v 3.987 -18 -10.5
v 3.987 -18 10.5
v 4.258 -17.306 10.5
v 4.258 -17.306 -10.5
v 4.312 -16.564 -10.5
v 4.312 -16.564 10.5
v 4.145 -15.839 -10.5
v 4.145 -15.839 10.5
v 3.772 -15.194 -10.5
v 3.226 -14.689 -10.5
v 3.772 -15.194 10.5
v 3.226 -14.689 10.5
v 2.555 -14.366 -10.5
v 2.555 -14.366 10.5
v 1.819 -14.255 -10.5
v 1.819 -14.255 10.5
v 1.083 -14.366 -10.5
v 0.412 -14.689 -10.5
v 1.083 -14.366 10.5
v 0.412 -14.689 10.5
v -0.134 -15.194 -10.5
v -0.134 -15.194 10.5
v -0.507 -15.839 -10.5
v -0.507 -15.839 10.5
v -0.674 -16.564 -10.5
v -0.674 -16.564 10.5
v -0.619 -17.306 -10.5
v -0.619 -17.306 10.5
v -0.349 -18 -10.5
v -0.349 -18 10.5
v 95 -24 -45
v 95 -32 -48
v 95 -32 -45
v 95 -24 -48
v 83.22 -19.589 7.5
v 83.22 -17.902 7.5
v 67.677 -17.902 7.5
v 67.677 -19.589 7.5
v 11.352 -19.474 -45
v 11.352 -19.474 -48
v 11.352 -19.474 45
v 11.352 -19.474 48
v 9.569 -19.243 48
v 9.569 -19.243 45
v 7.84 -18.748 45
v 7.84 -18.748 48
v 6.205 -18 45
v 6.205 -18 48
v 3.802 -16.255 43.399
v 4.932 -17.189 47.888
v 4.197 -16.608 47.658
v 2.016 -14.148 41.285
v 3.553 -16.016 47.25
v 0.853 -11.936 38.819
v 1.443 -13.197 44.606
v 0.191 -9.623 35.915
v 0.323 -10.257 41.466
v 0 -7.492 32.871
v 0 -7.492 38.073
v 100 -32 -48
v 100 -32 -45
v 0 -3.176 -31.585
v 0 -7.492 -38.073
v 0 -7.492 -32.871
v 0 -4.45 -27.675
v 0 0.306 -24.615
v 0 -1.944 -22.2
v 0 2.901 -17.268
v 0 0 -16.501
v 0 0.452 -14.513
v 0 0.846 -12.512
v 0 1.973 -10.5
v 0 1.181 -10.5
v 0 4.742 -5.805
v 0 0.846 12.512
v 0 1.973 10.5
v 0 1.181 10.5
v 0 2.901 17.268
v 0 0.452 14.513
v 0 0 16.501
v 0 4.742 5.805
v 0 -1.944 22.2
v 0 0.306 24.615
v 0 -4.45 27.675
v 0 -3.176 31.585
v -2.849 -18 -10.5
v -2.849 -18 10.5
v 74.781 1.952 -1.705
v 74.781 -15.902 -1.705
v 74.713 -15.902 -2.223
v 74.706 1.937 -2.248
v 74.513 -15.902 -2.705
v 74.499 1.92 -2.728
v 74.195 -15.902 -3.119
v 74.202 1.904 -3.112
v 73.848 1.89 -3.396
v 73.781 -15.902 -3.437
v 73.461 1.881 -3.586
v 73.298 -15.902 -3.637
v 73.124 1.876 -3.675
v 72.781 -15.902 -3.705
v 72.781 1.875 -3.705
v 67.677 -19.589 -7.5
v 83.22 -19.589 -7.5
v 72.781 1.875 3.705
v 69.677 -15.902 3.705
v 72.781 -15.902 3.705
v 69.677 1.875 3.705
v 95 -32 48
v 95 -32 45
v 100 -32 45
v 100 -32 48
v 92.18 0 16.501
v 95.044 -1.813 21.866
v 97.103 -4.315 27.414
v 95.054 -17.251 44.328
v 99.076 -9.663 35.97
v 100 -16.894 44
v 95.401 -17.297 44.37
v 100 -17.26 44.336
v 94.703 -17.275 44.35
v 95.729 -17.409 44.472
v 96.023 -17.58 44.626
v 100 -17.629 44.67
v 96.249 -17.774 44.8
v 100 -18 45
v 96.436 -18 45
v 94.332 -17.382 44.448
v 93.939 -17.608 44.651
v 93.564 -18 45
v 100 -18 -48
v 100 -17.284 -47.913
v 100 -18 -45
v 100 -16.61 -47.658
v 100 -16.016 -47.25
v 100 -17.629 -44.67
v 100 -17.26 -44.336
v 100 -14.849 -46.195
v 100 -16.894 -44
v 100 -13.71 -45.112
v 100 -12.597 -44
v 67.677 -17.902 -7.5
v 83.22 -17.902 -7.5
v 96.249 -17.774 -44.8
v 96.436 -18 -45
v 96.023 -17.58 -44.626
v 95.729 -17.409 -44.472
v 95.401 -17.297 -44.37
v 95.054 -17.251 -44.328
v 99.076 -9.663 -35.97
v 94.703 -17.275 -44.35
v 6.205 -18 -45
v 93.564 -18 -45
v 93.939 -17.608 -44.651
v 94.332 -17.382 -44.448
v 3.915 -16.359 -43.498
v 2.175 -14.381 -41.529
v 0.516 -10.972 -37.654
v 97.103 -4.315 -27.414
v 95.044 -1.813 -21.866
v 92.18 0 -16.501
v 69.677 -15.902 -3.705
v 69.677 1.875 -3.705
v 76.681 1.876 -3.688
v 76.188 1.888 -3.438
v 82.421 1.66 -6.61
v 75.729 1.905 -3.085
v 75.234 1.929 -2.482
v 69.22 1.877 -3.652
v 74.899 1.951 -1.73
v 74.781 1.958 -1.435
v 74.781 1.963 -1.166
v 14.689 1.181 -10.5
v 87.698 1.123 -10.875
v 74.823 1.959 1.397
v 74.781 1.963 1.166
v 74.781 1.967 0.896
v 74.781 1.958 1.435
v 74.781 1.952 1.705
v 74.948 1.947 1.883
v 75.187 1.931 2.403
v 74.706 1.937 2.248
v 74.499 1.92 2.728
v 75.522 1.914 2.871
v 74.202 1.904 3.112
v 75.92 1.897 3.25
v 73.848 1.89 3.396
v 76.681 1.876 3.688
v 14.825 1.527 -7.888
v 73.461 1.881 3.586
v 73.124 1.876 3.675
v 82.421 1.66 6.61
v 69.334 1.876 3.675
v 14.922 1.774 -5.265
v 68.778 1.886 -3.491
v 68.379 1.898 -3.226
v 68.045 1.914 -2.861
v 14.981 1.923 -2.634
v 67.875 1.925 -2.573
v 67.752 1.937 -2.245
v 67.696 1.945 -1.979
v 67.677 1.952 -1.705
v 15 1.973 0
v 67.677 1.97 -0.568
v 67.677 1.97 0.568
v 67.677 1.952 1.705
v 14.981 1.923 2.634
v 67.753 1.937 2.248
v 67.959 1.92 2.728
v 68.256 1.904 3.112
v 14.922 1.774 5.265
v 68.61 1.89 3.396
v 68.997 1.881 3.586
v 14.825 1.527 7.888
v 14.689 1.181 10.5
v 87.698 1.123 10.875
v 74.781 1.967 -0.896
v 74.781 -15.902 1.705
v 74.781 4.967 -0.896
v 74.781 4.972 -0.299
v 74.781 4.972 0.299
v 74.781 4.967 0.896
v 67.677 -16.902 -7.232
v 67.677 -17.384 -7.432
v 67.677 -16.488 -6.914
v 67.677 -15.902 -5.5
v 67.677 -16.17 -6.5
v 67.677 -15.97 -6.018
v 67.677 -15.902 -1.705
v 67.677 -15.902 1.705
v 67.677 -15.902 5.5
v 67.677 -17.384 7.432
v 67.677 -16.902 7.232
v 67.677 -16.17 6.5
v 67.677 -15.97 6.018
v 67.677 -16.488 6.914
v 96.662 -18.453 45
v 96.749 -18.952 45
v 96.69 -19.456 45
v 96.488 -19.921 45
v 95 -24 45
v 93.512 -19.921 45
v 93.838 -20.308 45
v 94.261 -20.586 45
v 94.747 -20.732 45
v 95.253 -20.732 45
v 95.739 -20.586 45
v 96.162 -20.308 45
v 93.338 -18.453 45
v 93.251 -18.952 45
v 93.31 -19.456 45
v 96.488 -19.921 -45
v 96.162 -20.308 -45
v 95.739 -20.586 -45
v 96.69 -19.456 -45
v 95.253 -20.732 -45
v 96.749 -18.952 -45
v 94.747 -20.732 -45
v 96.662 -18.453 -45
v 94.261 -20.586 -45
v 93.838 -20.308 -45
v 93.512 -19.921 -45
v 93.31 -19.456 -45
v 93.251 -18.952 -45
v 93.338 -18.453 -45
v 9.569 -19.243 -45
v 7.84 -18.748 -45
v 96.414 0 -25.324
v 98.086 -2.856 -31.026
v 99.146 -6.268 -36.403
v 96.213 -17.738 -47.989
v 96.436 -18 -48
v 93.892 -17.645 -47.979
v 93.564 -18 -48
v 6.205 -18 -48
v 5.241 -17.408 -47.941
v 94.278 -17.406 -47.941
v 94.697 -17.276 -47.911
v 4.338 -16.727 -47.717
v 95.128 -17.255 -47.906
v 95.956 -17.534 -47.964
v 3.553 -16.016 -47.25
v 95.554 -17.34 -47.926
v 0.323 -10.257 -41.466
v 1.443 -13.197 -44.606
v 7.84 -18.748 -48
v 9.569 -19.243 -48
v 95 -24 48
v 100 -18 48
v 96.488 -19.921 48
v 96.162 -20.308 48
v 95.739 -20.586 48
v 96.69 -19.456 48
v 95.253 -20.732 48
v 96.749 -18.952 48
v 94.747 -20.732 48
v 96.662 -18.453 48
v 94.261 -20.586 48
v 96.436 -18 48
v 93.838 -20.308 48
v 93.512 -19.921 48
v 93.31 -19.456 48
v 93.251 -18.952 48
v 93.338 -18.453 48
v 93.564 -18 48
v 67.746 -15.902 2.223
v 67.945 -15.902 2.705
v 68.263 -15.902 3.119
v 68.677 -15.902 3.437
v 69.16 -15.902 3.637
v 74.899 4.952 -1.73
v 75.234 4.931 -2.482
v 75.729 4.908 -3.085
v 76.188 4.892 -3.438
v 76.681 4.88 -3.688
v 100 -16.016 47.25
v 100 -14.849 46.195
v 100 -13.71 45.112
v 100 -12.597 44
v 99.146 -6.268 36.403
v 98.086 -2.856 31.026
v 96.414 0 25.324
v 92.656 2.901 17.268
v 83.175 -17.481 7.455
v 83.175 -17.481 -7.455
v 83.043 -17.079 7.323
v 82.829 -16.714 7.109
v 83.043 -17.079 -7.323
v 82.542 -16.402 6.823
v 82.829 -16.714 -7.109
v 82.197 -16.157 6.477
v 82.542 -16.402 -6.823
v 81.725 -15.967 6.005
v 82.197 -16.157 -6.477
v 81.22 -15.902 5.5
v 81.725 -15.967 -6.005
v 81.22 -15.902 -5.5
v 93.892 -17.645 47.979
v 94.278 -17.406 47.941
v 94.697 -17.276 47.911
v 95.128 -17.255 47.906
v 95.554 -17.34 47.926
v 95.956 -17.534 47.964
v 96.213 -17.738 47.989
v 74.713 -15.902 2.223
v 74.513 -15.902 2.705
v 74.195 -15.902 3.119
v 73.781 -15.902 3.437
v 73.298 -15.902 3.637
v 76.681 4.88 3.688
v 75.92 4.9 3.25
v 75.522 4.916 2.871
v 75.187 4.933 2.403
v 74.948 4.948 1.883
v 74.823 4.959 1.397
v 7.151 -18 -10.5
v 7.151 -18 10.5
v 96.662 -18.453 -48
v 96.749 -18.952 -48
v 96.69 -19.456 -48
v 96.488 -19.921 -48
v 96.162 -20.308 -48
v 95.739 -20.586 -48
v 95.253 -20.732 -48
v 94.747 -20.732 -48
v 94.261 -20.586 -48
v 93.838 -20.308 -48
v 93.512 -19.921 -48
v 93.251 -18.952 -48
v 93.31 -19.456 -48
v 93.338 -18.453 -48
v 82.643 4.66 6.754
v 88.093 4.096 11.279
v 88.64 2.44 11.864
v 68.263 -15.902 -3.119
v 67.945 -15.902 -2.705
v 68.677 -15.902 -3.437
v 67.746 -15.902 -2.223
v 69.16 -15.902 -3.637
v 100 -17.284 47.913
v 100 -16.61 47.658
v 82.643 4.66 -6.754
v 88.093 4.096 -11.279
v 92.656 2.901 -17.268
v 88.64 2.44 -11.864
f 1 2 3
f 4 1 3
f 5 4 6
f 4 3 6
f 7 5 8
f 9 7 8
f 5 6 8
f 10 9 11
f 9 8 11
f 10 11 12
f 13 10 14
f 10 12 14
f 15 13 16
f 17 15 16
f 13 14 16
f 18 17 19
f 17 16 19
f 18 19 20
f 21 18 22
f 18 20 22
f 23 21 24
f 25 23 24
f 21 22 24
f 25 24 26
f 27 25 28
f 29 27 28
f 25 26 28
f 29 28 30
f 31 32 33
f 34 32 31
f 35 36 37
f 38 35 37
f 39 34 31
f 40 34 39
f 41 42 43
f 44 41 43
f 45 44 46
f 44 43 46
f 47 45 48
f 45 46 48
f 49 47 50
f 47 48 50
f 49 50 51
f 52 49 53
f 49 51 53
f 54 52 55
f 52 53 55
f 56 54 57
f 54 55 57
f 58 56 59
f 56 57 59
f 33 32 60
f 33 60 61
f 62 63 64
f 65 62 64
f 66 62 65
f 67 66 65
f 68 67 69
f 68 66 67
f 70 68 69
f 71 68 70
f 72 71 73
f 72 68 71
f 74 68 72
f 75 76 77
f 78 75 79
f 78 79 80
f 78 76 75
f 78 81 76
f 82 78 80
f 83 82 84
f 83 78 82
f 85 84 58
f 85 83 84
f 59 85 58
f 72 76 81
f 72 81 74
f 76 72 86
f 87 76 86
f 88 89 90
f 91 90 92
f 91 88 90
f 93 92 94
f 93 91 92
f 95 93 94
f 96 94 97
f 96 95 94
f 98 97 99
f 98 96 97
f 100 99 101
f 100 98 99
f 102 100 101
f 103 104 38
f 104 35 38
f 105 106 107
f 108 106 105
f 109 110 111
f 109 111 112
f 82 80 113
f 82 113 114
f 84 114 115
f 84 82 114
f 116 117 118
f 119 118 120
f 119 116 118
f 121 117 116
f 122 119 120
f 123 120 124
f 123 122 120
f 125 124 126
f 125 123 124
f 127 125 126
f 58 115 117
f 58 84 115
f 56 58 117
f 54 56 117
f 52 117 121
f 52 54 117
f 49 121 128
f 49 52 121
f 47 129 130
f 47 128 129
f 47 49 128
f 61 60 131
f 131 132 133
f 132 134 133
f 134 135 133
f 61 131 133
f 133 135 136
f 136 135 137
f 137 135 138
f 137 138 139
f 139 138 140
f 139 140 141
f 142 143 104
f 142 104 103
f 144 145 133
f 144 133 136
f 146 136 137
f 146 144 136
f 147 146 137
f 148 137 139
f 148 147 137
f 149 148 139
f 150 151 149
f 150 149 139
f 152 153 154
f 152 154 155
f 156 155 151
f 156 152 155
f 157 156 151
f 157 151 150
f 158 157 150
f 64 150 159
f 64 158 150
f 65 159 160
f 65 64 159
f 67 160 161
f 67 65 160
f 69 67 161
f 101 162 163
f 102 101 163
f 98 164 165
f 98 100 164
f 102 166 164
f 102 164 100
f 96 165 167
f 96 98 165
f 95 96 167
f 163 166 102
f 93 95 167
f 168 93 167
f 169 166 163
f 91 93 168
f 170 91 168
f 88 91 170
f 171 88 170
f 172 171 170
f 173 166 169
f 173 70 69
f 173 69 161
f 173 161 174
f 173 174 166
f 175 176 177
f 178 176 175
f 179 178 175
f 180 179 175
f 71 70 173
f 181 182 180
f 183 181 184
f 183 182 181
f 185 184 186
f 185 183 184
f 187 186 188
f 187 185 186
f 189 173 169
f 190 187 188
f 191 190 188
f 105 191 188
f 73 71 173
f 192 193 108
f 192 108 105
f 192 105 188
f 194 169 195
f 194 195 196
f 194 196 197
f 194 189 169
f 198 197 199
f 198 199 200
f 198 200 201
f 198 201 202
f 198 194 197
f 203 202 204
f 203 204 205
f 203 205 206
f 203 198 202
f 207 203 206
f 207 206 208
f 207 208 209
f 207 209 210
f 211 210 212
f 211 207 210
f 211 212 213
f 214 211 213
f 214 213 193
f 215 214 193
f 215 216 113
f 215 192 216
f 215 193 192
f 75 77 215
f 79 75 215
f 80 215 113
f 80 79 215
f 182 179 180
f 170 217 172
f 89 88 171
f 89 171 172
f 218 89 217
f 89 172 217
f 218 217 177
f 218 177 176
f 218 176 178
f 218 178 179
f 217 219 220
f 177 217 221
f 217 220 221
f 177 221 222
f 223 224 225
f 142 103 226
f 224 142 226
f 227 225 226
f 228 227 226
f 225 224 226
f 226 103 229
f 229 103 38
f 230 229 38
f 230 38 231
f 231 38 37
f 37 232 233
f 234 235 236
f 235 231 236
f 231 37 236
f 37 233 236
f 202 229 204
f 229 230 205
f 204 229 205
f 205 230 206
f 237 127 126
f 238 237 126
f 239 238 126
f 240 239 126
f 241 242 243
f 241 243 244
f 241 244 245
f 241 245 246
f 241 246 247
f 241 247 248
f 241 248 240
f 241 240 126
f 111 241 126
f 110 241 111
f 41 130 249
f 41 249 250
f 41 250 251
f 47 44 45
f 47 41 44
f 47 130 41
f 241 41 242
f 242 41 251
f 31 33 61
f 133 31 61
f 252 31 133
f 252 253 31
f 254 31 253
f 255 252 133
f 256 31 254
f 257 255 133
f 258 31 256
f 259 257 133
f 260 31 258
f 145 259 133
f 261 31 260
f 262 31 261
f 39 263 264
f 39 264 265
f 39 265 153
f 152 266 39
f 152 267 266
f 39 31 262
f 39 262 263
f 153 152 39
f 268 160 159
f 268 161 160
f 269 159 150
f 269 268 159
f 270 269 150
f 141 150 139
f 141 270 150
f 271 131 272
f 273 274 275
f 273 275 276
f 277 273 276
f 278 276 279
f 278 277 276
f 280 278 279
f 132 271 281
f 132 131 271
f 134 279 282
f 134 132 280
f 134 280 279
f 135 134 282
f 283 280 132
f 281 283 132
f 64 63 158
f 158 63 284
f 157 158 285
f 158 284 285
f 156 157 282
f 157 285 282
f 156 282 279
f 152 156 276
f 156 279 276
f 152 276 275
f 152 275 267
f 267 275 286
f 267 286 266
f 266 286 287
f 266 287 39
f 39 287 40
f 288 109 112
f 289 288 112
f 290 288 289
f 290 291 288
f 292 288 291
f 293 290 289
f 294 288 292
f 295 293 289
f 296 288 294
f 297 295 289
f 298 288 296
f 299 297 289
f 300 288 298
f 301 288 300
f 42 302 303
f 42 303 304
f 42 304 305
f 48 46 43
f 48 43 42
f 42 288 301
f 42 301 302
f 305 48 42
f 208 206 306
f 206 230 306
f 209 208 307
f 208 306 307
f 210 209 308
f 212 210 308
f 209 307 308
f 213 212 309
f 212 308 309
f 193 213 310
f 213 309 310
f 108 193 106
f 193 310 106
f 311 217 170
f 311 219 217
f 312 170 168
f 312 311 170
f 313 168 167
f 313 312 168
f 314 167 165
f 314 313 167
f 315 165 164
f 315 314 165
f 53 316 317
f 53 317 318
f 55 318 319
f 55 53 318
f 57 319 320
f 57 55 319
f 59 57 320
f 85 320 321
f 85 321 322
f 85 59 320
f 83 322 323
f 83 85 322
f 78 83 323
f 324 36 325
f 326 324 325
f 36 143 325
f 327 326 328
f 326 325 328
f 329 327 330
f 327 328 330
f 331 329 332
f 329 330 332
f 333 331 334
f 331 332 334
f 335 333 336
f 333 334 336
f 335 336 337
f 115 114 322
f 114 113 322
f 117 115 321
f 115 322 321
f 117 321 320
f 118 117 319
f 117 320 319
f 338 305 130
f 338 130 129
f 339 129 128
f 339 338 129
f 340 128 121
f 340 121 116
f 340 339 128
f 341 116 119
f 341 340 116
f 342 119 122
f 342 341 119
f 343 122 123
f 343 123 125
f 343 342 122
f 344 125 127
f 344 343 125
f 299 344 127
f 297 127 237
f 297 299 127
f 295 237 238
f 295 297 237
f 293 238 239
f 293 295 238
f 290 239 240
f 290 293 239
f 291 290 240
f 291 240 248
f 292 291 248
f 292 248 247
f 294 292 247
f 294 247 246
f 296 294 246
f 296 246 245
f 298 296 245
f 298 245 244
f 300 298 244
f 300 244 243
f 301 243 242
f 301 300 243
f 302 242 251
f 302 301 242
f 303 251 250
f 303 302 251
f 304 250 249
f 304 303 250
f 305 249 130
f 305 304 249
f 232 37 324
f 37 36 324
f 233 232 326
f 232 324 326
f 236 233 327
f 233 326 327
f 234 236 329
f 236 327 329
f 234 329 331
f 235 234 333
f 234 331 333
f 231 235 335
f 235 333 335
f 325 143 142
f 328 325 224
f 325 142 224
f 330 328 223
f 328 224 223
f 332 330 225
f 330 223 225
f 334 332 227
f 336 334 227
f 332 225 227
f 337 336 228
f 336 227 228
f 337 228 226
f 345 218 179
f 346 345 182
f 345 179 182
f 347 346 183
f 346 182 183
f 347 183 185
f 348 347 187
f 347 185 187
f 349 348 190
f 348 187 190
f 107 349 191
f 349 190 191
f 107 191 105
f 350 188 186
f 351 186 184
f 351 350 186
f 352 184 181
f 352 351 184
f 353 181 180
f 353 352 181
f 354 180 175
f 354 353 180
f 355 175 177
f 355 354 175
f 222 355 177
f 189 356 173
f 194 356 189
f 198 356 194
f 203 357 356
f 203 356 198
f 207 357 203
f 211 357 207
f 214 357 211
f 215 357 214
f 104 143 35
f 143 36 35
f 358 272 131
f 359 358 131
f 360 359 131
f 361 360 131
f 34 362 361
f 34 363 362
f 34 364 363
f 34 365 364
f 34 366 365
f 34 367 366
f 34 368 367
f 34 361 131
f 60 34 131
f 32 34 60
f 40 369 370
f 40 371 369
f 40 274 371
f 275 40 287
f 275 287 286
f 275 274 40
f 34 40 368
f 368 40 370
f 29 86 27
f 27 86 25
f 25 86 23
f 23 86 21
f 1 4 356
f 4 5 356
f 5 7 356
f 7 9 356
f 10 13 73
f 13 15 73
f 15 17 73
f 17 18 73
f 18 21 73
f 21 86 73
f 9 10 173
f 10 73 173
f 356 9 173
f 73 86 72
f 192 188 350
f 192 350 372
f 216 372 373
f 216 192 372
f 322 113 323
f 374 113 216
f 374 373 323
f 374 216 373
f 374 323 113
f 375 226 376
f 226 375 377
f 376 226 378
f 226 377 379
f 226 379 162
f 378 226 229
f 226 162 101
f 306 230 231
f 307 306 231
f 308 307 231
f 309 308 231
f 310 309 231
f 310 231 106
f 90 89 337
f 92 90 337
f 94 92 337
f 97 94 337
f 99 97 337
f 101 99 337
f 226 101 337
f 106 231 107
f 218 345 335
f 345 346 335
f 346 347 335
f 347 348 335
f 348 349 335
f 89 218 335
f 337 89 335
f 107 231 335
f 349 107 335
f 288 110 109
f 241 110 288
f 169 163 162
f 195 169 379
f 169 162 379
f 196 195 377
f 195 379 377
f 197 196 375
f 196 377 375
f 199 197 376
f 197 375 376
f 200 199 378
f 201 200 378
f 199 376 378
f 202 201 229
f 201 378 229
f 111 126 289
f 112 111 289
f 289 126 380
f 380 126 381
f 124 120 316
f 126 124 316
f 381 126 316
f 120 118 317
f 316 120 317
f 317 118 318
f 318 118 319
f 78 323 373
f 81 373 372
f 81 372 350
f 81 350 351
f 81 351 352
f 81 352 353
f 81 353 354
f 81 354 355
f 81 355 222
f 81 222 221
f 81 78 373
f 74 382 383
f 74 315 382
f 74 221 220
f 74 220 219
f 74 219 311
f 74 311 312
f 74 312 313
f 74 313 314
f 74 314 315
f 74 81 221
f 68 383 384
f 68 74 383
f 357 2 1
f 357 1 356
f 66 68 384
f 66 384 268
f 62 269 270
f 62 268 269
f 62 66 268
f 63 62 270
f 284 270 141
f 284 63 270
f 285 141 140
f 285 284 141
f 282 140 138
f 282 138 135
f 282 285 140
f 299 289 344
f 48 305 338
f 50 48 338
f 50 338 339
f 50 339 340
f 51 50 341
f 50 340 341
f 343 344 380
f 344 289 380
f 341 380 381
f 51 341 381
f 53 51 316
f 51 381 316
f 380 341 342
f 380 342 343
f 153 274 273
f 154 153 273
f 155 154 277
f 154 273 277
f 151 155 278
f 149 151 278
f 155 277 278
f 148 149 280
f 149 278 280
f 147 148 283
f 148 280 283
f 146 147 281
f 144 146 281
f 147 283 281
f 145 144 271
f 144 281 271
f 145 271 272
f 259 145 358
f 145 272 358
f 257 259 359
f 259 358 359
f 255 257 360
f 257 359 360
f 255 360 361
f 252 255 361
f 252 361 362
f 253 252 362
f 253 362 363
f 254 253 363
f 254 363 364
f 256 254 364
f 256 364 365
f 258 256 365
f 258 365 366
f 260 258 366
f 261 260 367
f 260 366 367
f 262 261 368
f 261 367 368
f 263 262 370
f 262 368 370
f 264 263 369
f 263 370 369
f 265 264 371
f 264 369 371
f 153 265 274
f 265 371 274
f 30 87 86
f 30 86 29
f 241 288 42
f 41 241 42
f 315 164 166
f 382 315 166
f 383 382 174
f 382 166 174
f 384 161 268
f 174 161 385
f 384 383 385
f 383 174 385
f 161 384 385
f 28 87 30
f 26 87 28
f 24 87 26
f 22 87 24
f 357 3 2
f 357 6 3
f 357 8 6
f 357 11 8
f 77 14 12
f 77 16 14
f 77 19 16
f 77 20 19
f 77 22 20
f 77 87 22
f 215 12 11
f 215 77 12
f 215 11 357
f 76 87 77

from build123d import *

# Parameters (mm, degrees)
EXTRUDE_THIN1_DEPTH = 100
CUT_EXTRUDE2_DEPTH  = 33.5
FILLET1_R           = 3
SKETCH6_W           = 108.67085681690114
SKETCH6_H           = 17.87977423217149
CUT_EXTRUDE3_DEPTH  = 166
BOSS_EXTRUDE1_DEPTH = 10.5
CUT_EXTRUDE4_DEPTH  = 27.00000000000001
SKETCH11_R          = 1.749999999999997
CUT_EXTRUDE5_DEPTH  = 5
BOSS_EXTRUDE2_DEPTH = 7.500000000000001
CUT_EXTRUDE6_START  = -15.000000000000002
CUT_EXTRUDE6_DEPTH  = 15.000000000000002
FILLET3_R           = 2
CUT_EXTRUDE7_DEPTH  = 5.000000000000001
FILLET5_R           = 12


with BuildPart() as part:
    # Sketch1 → Extrude-Thin1 (new body)
    with BuildSketch(Plane(origin=(0, 0, 0), x_dir=(0, 0, -1), z_dir=(1, 0, 0))):
        with BuildLine():
            Line((44.99999999999999, -32), (45, -18.000000000000004))
            ThreePointArc((45, -18.000000000000004), (32.040658090715816, -6.957616725901104), (16.501342127994352, -3.94e-15))
            ThreePointArc((16.501342127994352, -3.94e-15), (-9.68e-15, 1.9727576042150758), (-16.501342127994352, 2.58e-15))
            ThreePointArc((-16.501342127994352, 2.58e-15), (-32.040658090715816, -6.957616725901083), (-45, -17.99999999999999))
            Line((-45, -17.99999999999999), (-45.00000000000001, -31.999999999999986))
            Line((-45.00000000000001, -31.999999999999986), (-48.00000000000001, -31.999999999999986))
            Line((-48.00000000000001, -31.999999999999986), (-48, -16.881858139762553))
            ThreePointArc((-48, -16.881858139762553), (-34.09998293164343, -4.712774745757805), (-17.2676846598946, 2.901081047578947))
            ThreePointArc((-17.2676846598946, 2.901081047578947), (-9.055e-14, 4.972757604215076), (17.26768465989443, 2.901081047578978))
            ThreePointArc((17.26768465989443, 2.901081047578978), (34.099982931643346, -4.71277474575777), (48, -16.881858139762553))
            Line((48, -16.881858139762553), (47.99999999999999, -32))
            Line((47.99999999999999, -32), (44.99999999999999, -32))
        make_face()
    extrude(amount=EXTRUDE_THIN1_DEPTH)

    # Sketch5 → Cut-Extrude2 (cut, symmetric)
    with BuildSketch(Plane(origin=(0, 0, 0), x_dir=(1, 0, 0), z_dir=(0, 1, 0))):
        with BuildLine():
            Line((74.78082212000585, 2.9999999999999996), (74.78082212000585, -3.0000000000000004))
            add(Edge.make_bspline(
                [(74.78082212000585, -3.0000000000000004), (97.6340902919286, -10.562952056895462), (100, -44)],
                knots=[0, 0, 0, 1, 1, 1], degree=2))
            Line((100, -44), (100, 44))
            add(Edge.make_bspline(
                [(74.78082212000585, 2.9999999999999996), (97.6340902919286, 10.562952056895462), (100, 44)],
                knots=[0, 0, 0, 1, 1, 1], degree=2))
        make_face()
    extrude(amount=CUT_EXTRUDE2_DEPTH, both=True, mode=Mode.SUBTRACT)

    # Fillet1
    fillet1_edges = [part.edges().sort_by_distance(p)[0] for p in [
        (50, -16.881858139762556, -48),
        (50, -16.88185813976255, 48),
        (74.78082212000585, 3.4097650316477264, 3.0000000000000004),
        (74.78082212000585, 3.4097650316477246, -2.9999999999999996),
        (46.32817175668929, 2.9010810475789732, -17.267684659894428),
        (46.328171756689336, 2.9010810475789484, 17.267684659894588),
    ]]
    fillet(fillet1_edges, radius=FILLET1_R)

    # Sketch6 → Cut-Extrude3 (cut)
    with BuildSketch(Plane(origin=(0, -2.379e-14, -48.00000000000001), x_dir=(-1, 0, 0), z_dir=(0, -5e-16, -1))):
        with Locations((-40.66457159154943, -32.93988711608573)):
            Rectangle(SKETCH6_W, SKETCH6_H)
    extrude(amount=-CUT_EXTRUDE3_DEPTH, mode=Mode.SUBTRACT)

    # Sketch8 → Boss-Extrude1 (add, symmetric)
    with BuildSketch(Plane.XY):
        Polygon((0, 1.9727576042150723), (-2.8489105039621805, -17.99999999999999), (7.1510894960378195, -17.99999999999999), (15, 1.972757604215074), align=None)
    extrude(amount=BOSS_EXTRUDE1_DEPTH, both=True)

    # Sketch10 → Cut-Extrude4 (cut)
    with BuildSketch(Plane.XY.offset(10.5)):
        with BuildLine():
            Line((-0.3489105039621806, -17.99999999999999), (3.9871579959635945, -17.99999999999999))
            ThreePointArc((3.9871579959635945, -17.99999999999999), (1.8191237460007066, -14.255159652410038), (-0.3489105039621806, -17.99999999999999))
        make_face()
    extrude(amount=-CUT_EXTRUDE4_DEPTH, mode=Mode.SUBTRACT)

    # Sketch11 → Cut-Extrude5 (cut)
    with BuildSketch(Plane(origin=(0, -2.379e-14, -48.00000000000001), x_dir=(-1, 0, 0), z_dir=(0, -5e-16, -1))):
        with Locations(Location((-95, -18.99999999999998, 0), (0, 0, 34.849904579))):
            Circle(SKETCH11_R)
    cut_extrude5 = extrude(amount=-CUT_EXTRUDE5_DEPTH, mode=Mode.SUBTRACT)

    # Mirror1: Cut-Extrude5 across plane
    add(cut_extrude5.mirror(Plane.XY), mode=Mode.SUBTRACT)

    # Sketch12 → Boss-Extrude2 (add, symmetric)
    with BuildSketch(Plane.XY):
        Polygon((74.78082212000585, 1.9727576042150723), (74.78082212000585, -15.901753636370586), (83.21987044067507, -15.901753636370586), (83.21987044067507, -19.589110757152636), (67.6773818593807, -19.589110757152636), (67.6773818593807, 1.9727576042150723), align=None)
    extrude(amount=BOSS_EXTRUDE2_DEPTH, both=True)

    # Sketch13 → Cut-Extrude6 (cut)
    with BuildSketch(Plane(origin=(74.78082212000585, 0, 0), x_dir=(0, 0, -1), z_dir=(1, 0, 0)).offset(CUT_EXTRUDE6_START)):
        with BuildLine():
            Line((-7.500000000000001, 1.569812139590343), (-7.499999999999999, -15.901753636370586))
            Line((-7.499999999999999, -15.901753636370586), (-3.7049771024193907, -15.901753636370586))
            Line((-3.7049771024193907, -15.901753636370586), (-3.7049771024193907, 1.8746398726529334))
            ThreePointArc((-3.7049771024193907, 1.8746398726529334), (-5.604561352429517, 1.748031821138369), (-7.500000000000001, 1.569812139590343))
        make_face()
        with BuildLine():
            Line((7.499999999999999, -15.901753636370586), (3.7049771024193907, -15.901753636370586))
            Line((3.7049771024193907, -15.901753636370586), (3.7049771024193907, 1.8746398726529334))
            ThreePointArc((3.7049771024193907, 1.8746398726529334), (5.6045613524295295, 1.7480318211384258), (7.500000000000001, 1.569812139590343))
            Line((7.500000000000001, 1.569812139590343), (7.499999999999999, -15.901753636370586))
        make_face()
    extrude(amount=CUT_EXTRUDE6_DEPTH, mode=Mode.SUBTRACT)

    # Fillet3
    fillet3_edges = [part.edges().sort_by_distance(p)[0] for p in [
        (75.44862615002788, -15.901753636370586, -7.5),
        (83.21987044067507, -15.901753636370586, 0),
        (75.44862615002788, -15.901753636370586, 7.5),
        (67.6773818593807, -7.013556881858825, -3.7049771024193907),
        (67.6773818593807, -7.013556881858825, 3.7049771024193907),
        (74.78082212000585, -7.013556881858825, 3.7049771024193907),
        (74.78082212000585, -7.013556881858825, -3.7049771024193907),
    ]]
    fillet(fillet3_edges, radius=FILLET3_R)

    # Sketch15 → Cut-Extrude7 (cut)
    with BuildSketch(Plane(origin=(0, -2.379e-14, -48.00000000000001), x_dir=(-1, 0, 0), z_dir=(0, -5e-16, -1))):
        Polygon((-95, -23.99999999999998), (0, -18.860125054588586), (0, -26.572046869734645), align=None)
    cut_extrude7 = extrude(amount=-CUT_EXTRUDE7_DEPTH, mode=Mode.SUBTRACT)

    # Mirror2: Cut-Extrude7 across plane
    add(cut_extrude7.mirror(Plane.XY), mode=Mode.SUBTRACT)

    # Fillet5
    # the kernel refuses this fillet: 12 mm, written as the material it takes off along each edge
    with BuildSketch(Plane(origin=(0, -18.860125054588625, 76.42075806632201), x_dir=(0, 1, 5e-16), z_dir=(0, 5e-16, -1))) as fillet5_piece_1:
        with BuildLine():
            CenterArc((FILLET5_R * 0.947358602211, FILLET5_R), FILLET5_R, 183.09690836649892, 86.90309163350105)
            Line((-FILLET5_R * 0.0511809847104, FILLET5_R * 0.945975067318), (0, 0))
            Line((0, 0), (FILLET5_R * 0.947358602211, 0))
        make_face()
    extrude(amount=59.841516132644024, mode=Mode.SUBTRACT)
    with BuildSketch(Plane(origin=(0, -18.860125054588625, -76.42075806632201), x_dir=(0, 1, -5e-16), z_dir=(0, 5e-16, 1))) as fillet5_piece_2:
        with BuildLine():
            CenterArc((FILLET5_R * 0.947358602211, -FILLET5_R), FILLET5_R, 90, 86.90309163350108)
            Line((-FILLET5_R * 0.0511809847104, -FILLET5_R * 0.945975067318), (0, 0))
            Line((0, 0), (FILLET5_R * 0.947358602211, 0))
        make_face()
    extrude(amount=59.841516132644024, mode=Mode.SUBTRACT)


solid = part.part
